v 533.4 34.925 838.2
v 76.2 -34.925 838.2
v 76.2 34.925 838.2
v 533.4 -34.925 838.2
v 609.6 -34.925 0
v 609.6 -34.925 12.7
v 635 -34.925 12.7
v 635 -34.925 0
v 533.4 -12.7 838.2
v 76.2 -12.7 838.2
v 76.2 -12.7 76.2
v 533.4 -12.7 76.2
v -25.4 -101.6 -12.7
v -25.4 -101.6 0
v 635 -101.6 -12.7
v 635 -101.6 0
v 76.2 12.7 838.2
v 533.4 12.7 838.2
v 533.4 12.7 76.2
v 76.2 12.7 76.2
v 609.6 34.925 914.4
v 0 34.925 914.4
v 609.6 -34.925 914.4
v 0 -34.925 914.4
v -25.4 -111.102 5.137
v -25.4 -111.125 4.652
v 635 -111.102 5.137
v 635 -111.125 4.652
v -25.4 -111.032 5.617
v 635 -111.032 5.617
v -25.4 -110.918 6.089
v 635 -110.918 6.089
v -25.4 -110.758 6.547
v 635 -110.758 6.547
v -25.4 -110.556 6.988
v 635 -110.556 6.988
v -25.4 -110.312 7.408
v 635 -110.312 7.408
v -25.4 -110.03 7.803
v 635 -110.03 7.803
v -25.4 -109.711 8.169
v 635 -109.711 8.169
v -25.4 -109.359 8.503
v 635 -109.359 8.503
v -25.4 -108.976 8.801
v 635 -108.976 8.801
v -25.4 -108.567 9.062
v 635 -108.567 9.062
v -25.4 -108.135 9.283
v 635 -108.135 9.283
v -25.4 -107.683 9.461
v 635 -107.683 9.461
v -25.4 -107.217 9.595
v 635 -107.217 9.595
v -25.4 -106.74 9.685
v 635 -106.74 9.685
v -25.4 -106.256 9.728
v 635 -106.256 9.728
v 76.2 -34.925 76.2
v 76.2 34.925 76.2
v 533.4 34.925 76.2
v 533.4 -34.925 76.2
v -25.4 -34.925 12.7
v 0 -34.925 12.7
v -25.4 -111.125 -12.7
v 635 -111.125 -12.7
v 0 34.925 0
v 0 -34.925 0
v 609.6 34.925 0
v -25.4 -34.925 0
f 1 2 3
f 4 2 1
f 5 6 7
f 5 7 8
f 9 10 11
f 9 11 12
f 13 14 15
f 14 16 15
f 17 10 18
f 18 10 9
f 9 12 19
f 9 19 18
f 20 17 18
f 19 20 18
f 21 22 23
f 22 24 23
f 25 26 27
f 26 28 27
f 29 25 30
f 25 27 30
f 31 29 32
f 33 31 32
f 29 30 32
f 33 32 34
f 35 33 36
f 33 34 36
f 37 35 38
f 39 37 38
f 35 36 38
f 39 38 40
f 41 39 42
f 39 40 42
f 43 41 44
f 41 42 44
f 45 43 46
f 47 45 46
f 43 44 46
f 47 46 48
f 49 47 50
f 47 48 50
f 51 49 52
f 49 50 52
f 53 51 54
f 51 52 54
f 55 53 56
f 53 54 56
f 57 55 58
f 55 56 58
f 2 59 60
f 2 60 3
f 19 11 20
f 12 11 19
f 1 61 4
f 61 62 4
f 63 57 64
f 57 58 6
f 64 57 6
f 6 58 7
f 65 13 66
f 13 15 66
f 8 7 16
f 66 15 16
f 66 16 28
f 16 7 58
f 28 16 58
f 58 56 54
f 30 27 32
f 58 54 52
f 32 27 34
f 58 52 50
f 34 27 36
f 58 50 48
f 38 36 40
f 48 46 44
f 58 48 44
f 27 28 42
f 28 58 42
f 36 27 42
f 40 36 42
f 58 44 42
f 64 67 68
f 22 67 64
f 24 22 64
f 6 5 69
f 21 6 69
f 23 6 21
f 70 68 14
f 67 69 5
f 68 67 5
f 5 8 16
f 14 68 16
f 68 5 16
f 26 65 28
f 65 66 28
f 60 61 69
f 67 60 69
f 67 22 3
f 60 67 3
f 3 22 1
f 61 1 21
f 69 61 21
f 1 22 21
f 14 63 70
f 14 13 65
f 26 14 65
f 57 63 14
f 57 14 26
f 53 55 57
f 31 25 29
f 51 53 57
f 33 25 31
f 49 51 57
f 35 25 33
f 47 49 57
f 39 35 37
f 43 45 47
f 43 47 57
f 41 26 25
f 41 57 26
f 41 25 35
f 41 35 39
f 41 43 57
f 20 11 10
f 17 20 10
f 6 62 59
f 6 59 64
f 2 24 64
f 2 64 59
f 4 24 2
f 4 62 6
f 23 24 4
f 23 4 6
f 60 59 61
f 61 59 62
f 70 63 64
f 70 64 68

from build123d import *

# Parameters (mm, degrees)
F0_W          = 609.6
F0_H          = 914.4
F0_W_2        = 457.2
F0_H_2        = 762
F1_DEPTH      = 34.925
F2_W          = 457.2
F2_H          = 762
F3_DEPTH      = 12.7
F5_DEPTH      = 635
F5_DEPTH_BACK = 25.4
F6_R          = 5.08


with BuildPart() as f1:
    # F0 (on Front) → F1 (new body, symmetric)
    with BuildSketch(Plane.XZ):
        with Locations((304.8, 457.2)):
            Rectangle(F0_W, F0_H)
        with Locations((304.8, 457.2)):
            Rectangle(F0_W_2, F0_H_2, mode=Mode.SUBTRACT)
    extrude(amount=F1_DEPTH, both=True)

    # F4 (on face) → F5 (join, two sides)
    with BuildSketch(Plane(origin=(0, 0, 0), x_dir=(0, -1, 0), z_dir=(-1, 0, 0))) as f5_sk:
        Polygon((34.925, 12.7), (34.925, 0), (101.6, 0), (101.6, -12.7), (111.125, -12.7), (111.125, 9.525), align=None)
    extrude(amount=-F5_DEPTH)
    extrude(f5_sk.sketch, amount=F5_DEPTH_BACK)

    # F6
    f6_edges = [f1.edges().sort_by_distance(p)[0] for p in [
        (304.8, -111.125, 9.525),
    ]]
    fillet(f6_edges, radius=F6_R)


with BuildPart() as f3:
    # F2 (on Front) → F3 (new body, symmetric)
    with BuildSketch(Plane.XZ):
        with Locations((304.8, 457.2)):
            Rectangle(F2_W, F2_H)
    extrude(amount=F3_DEPTH, both=True)


solid = Compound([f1.part, f3.part])
